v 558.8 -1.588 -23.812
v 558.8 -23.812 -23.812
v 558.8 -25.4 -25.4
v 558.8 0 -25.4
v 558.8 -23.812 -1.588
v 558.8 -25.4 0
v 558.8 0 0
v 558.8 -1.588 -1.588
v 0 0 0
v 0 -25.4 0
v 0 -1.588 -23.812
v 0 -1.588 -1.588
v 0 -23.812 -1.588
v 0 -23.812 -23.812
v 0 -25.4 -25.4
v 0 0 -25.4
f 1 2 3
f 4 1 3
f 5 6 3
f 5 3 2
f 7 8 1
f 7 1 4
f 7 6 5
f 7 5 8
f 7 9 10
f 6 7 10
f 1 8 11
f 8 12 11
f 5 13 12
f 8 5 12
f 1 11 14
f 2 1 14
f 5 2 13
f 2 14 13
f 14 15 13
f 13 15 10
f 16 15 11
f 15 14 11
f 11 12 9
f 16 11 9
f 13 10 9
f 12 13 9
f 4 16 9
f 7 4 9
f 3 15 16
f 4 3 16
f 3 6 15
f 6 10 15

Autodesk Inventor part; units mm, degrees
ref_plane "YZ Plane" through (0, 0, 0) normal (1, 0, 0) x (0, 1, 0)
ref_plane "XZ Plane" through (0, 0, 0) normal (0, 1, 0) x (-1, 0, 0)
ref_plane "XY Plane" through (0, 0, 0) normal (0, 0, 1) x (1, 0, 0)
sketch "Sketch1" plane through (0, 0, 0) normal (1, 0, 0) x (0, 1, 0)
  line L0 (0, 0) -> (-25.4, 0)
  line L1 (-25.4, 0) -> (-25.4, -25.4)
  line L2 (-25.4, -25.4) -> (0, -25.4)
  line L3 (0, -25.4) -> (0, 0)
  line L4 (-1.5875, -23.8125) -> (-23.8125, -23.8125)
  line L5 (-23.8125, -23.8125) -> (-23.8125, -1.5875)
  line L6 (-23.8125, -1.5875) -> (-1.5875, -1.5875)
  line L7 (-1.5875, -1.5875) -> (-1.5875, -23.8125)
  point P0 (-12.7, -23.8125)
  point P1 (-12.7, -25.4)
  point P2 (-23.8125, -12.7)
  point P3 (-1.5875, -12.7)
  dimension "d0" = 25.4
  dimension "d1" = 25.4
  dimension "d2" = 1.5875
  dimension "d3" = 1.5875
  dimension "d4" = 1.5875
  dimension "d5" = 1.5875
extrude "Extrusion1" add sketch "Sketch1" along normal blind 558.8
properties part number "44.92cmTube" material "Aluminum 6061"
